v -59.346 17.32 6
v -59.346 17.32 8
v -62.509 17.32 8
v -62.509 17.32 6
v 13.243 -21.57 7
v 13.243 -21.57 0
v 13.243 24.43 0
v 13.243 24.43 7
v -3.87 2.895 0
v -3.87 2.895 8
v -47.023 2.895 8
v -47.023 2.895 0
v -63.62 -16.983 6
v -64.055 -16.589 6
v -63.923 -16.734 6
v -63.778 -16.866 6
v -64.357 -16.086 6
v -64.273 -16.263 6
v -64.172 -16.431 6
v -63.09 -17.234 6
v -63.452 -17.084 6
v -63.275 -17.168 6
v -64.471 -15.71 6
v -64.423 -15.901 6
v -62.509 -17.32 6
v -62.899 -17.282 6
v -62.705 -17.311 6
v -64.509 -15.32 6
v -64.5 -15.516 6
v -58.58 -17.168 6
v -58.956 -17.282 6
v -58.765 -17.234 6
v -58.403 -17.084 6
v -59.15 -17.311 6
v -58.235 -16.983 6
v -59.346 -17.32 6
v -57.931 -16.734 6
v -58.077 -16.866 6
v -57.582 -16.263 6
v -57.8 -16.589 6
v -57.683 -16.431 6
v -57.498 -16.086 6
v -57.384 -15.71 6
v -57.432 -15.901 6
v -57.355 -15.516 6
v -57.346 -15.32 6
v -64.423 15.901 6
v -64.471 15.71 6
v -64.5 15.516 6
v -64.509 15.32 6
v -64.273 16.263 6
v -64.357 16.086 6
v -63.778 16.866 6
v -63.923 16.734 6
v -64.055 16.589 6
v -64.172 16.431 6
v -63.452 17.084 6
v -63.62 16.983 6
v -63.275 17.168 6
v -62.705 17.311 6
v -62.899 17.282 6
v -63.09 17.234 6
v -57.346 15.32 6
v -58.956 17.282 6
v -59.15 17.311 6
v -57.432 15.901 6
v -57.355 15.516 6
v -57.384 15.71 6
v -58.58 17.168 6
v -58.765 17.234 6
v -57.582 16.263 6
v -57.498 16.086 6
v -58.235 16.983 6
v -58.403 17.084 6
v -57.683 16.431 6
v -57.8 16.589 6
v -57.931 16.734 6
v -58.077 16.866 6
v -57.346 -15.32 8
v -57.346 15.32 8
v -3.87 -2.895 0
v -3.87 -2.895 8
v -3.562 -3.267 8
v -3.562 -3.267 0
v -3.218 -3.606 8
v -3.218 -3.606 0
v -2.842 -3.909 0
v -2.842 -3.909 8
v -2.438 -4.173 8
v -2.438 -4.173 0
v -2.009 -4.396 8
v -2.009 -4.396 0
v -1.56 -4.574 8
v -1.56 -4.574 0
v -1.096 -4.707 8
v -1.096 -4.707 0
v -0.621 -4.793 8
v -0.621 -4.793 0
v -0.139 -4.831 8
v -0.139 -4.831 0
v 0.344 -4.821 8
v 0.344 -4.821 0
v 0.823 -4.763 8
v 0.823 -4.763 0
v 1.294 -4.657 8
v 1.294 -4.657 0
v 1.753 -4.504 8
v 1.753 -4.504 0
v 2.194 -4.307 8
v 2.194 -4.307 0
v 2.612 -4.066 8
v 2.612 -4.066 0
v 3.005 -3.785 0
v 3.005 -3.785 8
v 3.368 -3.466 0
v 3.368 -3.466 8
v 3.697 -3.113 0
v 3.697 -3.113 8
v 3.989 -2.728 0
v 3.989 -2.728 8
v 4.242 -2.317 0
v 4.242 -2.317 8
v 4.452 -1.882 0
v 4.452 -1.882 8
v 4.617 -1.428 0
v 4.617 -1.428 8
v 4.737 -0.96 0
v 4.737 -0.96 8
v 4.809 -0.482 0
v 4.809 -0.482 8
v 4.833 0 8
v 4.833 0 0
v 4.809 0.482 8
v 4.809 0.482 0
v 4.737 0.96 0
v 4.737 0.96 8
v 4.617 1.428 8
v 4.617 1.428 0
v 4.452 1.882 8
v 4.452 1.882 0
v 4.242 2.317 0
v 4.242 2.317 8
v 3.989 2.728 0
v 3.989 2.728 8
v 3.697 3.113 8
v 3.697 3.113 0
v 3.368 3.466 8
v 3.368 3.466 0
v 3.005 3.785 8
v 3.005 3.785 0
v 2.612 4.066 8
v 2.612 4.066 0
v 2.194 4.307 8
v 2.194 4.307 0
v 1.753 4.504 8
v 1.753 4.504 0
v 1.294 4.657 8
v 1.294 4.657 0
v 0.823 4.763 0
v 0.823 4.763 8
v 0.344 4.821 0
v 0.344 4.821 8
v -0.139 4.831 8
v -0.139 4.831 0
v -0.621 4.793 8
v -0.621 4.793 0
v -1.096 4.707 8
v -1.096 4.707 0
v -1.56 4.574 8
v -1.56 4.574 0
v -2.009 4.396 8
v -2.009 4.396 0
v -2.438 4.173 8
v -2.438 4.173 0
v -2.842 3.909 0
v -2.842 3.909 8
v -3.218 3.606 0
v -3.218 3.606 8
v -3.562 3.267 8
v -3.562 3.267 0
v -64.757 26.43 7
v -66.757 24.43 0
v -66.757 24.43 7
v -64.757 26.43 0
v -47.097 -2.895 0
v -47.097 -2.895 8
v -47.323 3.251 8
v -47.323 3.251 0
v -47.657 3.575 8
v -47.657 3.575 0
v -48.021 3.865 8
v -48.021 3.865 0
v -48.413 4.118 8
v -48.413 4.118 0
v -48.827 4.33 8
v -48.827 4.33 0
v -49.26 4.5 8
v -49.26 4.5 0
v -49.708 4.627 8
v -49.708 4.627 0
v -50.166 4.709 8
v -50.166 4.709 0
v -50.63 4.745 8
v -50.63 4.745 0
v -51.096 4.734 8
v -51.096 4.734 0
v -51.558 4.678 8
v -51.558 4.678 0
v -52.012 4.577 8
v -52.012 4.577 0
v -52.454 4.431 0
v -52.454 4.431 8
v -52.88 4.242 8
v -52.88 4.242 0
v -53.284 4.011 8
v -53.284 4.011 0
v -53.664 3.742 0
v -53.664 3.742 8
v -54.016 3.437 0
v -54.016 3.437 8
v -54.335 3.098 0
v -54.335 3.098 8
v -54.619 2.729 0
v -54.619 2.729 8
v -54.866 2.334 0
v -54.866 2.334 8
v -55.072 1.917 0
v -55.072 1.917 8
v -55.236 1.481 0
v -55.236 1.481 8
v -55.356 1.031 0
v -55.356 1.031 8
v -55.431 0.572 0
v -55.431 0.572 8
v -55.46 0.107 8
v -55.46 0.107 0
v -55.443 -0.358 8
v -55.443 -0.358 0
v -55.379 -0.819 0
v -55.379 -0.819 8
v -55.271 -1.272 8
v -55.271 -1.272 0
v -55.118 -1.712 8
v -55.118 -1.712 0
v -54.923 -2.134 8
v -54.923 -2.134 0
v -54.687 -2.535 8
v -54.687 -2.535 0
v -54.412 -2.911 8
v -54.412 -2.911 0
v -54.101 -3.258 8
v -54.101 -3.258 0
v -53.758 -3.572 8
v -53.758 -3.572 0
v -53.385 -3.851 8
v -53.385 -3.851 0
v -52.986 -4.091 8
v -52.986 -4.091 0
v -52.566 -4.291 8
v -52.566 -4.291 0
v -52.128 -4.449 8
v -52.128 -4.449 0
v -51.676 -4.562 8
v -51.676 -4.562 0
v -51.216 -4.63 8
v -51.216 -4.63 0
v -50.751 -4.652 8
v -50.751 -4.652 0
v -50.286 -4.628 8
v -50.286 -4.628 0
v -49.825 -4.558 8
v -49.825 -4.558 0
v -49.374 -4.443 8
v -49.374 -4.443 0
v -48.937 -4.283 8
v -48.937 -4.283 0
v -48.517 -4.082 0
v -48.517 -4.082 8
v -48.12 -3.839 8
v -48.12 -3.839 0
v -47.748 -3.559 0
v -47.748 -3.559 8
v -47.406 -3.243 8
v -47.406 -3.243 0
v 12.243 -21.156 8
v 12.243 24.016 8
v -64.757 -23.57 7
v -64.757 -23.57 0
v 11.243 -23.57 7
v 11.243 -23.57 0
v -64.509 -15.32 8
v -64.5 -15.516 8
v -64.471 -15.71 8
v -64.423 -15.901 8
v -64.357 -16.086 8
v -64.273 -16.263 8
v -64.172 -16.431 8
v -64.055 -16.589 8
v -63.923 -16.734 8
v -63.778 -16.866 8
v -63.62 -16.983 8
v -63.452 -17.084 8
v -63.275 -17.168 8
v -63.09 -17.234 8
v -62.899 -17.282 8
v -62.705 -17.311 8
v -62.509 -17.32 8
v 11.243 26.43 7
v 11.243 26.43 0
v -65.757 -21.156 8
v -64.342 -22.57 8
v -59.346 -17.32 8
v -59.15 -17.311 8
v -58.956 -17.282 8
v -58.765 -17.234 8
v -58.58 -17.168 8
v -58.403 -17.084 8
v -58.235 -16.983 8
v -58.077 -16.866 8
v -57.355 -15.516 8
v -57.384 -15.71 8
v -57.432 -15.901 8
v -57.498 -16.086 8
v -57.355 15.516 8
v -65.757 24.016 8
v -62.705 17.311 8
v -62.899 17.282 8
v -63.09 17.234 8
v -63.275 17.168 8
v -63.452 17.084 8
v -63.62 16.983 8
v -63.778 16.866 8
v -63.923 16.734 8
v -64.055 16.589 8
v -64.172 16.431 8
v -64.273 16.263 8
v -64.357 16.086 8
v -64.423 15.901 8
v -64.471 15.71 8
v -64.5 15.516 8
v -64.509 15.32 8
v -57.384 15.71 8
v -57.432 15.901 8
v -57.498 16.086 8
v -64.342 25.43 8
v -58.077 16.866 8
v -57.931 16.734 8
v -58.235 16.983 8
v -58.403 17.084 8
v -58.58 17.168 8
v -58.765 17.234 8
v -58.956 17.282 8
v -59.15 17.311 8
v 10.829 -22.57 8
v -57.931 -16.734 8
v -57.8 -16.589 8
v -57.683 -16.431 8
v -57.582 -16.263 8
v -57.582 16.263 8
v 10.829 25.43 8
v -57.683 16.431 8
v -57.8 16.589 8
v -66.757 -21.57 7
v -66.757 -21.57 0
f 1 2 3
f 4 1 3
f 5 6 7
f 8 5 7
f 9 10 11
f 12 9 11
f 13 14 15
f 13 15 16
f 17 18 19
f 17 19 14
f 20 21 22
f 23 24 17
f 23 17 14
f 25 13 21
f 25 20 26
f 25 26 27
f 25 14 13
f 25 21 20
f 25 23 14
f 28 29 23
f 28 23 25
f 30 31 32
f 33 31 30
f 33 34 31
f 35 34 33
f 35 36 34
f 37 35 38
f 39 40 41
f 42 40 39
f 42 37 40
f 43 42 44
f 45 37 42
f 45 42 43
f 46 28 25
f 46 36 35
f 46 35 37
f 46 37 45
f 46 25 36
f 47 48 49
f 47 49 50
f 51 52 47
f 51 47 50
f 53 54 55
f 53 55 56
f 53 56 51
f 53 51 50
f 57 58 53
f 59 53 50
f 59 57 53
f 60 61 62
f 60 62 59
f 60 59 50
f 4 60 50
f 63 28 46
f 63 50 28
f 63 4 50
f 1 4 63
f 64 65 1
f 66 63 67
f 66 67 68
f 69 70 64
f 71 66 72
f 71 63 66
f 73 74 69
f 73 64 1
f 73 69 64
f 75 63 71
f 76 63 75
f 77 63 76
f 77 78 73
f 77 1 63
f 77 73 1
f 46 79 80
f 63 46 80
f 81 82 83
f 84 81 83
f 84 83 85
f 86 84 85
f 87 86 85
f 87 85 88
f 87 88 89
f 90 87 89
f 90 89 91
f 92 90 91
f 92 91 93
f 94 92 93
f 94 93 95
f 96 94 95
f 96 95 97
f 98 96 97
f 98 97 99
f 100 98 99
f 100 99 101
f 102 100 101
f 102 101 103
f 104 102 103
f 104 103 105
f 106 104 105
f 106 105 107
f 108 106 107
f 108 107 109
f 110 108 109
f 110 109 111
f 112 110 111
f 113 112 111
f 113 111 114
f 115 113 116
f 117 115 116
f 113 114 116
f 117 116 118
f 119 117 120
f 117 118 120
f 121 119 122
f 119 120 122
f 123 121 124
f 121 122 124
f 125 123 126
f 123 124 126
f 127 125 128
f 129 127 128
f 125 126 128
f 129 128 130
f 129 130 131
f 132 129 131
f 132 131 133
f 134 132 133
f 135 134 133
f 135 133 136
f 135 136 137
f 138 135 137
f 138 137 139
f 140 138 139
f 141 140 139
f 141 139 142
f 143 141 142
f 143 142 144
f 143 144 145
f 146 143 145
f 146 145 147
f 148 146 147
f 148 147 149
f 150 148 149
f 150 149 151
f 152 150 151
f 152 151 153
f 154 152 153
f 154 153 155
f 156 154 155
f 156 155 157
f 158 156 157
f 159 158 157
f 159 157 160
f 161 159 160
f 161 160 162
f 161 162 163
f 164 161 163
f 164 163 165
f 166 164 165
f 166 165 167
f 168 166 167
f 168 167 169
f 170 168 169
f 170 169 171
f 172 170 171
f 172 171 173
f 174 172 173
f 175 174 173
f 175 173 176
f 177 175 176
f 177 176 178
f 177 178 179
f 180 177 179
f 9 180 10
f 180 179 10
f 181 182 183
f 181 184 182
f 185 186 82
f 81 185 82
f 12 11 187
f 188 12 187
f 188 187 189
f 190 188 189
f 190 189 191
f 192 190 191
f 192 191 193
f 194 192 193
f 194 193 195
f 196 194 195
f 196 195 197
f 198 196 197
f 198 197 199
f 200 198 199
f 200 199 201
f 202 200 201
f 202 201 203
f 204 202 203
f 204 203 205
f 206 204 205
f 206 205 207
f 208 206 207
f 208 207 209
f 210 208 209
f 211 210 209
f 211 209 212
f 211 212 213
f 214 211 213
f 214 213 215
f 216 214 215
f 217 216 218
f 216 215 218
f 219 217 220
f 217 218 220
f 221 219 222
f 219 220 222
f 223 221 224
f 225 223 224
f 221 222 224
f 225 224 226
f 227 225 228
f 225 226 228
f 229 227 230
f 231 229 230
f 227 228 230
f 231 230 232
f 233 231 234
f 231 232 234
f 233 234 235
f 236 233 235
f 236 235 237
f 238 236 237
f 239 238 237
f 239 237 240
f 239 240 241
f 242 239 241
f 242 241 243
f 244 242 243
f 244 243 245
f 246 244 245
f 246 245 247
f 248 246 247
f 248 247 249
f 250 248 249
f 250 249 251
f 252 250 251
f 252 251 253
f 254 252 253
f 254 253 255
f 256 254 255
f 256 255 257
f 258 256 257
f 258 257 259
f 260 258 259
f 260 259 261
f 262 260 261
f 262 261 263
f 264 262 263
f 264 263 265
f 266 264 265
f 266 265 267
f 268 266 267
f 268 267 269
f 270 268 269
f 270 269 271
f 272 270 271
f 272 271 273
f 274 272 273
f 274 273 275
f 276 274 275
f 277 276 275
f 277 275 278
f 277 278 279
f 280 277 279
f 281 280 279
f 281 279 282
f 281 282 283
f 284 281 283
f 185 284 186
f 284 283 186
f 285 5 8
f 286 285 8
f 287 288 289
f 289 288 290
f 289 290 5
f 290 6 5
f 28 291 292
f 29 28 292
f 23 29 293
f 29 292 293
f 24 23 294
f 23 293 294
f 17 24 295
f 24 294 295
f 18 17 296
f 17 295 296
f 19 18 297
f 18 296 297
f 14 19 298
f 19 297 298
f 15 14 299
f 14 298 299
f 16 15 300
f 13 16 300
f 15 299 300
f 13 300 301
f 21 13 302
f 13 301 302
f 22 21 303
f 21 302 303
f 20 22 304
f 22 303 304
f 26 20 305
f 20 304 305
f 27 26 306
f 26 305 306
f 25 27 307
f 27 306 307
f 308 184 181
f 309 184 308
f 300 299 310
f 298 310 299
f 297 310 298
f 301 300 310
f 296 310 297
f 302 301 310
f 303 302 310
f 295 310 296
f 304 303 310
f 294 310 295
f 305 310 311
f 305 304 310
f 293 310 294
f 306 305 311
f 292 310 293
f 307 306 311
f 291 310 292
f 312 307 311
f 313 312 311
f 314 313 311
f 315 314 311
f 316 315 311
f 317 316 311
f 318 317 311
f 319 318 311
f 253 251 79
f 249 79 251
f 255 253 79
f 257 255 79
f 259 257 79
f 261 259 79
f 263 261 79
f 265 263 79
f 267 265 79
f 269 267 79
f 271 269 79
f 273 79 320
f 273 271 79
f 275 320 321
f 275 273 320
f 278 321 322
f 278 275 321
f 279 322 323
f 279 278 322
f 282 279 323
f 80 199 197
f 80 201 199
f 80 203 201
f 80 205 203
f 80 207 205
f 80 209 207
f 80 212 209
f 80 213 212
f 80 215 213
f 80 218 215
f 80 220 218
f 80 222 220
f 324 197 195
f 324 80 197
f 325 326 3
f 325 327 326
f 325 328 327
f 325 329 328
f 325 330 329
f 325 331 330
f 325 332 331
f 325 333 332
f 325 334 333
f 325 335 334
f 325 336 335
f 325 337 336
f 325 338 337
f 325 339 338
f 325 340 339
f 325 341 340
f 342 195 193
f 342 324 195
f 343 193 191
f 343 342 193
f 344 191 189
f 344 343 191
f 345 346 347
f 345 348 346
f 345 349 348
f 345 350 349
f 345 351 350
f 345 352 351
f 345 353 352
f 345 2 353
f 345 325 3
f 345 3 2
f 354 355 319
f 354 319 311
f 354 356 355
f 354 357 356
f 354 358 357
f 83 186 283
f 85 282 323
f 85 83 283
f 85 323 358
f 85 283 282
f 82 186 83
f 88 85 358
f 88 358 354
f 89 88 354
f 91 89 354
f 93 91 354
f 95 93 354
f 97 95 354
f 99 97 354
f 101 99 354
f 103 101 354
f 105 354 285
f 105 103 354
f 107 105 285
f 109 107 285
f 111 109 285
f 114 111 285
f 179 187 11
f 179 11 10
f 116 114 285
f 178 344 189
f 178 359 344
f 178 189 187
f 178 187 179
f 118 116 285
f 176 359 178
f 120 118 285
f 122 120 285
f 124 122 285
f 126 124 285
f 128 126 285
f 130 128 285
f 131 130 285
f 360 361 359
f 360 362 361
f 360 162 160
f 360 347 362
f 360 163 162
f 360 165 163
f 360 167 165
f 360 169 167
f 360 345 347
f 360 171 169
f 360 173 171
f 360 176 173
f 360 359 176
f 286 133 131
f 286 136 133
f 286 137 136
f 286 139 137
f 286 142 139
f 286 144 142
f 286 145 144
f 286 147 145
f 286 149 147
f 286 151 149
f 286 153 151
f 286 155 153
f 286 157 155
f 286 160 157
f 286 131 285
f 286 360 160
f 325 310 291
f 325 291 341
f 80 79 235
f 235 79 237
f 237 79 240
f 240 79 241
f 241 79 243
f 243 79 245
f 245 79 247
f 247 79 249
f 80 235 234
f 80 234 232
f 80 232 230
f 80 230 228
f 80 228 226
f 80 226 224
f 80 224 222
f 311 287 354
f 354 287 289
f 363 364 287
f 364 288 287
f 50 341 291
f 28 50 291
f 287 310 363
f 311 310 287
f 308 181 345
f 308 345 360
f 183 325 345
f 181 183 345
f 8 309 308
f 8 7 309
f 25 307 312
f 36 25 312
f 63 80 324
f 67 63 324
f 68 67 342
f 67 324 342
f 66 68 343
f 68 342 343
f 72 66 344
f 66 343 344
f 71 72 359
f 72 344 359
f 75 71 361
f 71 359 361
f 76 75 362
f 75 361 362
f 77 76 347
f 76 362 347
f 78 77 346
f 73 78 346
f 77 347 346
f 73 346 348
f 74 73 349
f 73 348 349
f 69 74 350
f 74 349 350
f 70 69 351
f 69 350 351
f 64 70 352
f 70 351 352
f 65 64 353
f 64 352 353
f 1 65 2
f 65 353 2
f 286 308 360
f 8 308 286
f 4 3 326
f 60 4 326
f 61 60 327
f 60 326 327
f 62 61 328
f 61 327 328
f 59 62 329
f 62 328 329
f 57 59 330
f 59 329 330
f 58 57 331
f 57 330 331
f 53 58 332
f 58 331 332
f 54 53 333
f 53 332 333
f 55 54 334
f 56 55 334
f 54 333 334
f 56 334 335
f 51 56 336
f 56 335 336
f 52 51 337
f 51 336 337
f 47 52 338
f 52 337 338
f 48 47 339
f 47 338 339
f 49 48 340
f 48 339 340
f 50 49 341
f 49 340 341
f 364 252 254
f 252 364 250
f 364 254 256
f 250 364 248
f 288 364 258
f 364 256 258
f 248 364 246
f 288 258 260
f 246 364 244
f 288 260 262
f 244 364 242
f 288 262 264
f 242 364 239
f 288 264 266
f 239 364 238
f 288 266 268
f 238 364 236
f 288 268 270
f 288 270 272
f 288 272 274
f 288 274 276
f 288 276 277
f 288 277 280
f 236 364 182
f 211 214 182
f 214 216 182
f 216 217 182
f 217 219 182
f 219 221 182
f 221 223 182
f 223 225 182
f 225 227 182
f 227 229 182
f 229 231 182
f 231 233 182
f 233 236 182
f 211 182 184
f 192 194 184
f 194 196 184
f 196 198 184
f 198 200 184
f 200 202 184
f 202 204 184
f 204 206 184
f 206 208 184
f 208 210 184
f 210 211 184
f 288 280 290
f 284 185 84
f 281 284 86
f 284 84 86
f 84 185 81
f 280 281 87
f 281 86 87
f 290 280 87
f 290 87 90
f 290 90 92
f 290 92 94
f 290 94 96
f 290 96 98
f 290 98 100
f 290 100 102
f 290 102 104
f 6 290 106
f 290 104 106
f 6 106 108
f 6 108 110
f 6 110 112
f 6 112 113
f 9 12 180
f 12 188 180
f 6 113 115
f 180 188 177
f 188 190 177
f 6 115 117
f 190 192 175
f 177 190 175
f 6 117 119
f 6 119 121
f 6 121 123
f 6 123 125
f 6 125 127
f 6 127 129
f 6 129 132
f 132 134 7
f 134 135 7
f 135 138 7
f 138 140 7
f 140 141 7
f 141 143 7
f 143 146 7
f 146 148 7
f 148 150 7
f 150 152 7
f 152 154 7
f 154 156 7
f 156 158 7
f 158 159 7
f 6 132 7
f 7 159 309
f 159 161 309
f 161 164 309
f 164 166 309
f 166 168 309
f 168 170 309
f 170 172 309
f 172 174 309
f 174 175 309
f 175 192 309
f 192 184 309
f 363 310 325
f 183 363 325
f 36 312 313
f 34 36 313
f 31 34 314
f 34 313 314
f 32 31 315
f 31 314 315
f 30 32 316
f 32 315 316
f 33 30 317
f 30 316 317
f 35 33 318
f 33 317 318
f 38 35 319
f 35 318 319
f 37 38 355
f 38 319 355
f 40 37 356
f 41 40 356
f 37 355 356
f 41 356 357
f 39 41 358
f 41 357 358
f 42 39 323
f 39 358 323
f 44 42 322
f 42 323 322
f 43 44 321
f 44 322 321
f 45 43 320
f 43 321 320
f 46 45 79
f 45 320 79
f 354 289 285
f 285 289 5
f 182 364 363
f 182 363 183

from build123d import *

# Parameters (mm, degrees)
F0_W     = 80
F0_H     = 50
F1_DEPTH = 8
F3_DEPTH = 25.4
F5_DEPTH = 2
F6_SIZE  = 2
F7_SIZE  = 1


with BuildPart() as f1:
    # F0 (on Top) → F1 (new body)
    with BuildSketch(Plane.XY):
        with Locations((-26.7566908151, 1.4298928609)):
            Rectangle(F0_W, F0_H)
    extrude(amount=F1_DEPTH)

    # F2 (on face) → F3 (cut)
    with BuildSketch(Plane.XY.offset(8)):
        with BuildLine():
            ThreePointArc((-3.870154056, -2.8950243141), (4.8331416487, 0), (-3.870154056, 2.8950243141))
            Line((-3.870154056, 2.8950243141), (-47.0229552257, 2.8950243141))
            ThreePointArc((-47.0229552257, 2.8950243141), (-55.4596716368, 0.1073182684), (-47.0969311879, -2.8950243141))
            Line((-47.0969311879, -2.8950243141), (-3.870154056, -2.8950243141))
        make_face()
    extrude(amount=-F3_DEPTH, mode=Mode.SUBTRACT)

    # F4 (on face) → F5 (cut)
    with BuildSketch(Plane.XY.offset(8)):
        with BuildLine():
            ThreePointArc((-57.3456808925, 15.3201337457), (-57.9314673301, 16.734347308), (-59.3456808925, 17.3201337457))
            Line((-59.3456808925, 17.3201337457), (-62.5092031037, 17.3201337457))
            ThreePointArc((-62.5092031037, 17.3201337457), (-63.9234166661, 16.734347308), (-64.5092031037, 15.3201337457))
            Line((-64.5092031037, 15.3201337457), (-64.5092031037, -15.3201337457))
            ThreePointArc((-64.5092031037, -15.3201337457), (-63.9234166661, -16.734347308), (-62.5092031037, -17.3201337457))
            Line((-62.5092031037, -17.3201337457), (-59.3456808925, -17.3201337457))
            ThreePointArc((-59.3456808925, -17.3201337457), (-57.9314673301, -16.734347308), (-57.3456808925, -15.3201337457))
            Line((-57.3456808925, -15.3201337457), (-57.3456808925, 15.3201337457))
        make_face()
    extrude(amount=-F5_DEPTH, mode=Mode.SUBTRACT)

    # F6
    f6_edges = [f1.edges().sort_by_distance(p)[0] for p in [
        (13.243309, 26.429893, 4),
        (13.243309, -23.570107, 4),
        (-66.756691, -23.570107, 4),
        (-66.756691, 26.429893, 4),
    ]]
    chamfer(f6_edges, length=F6_SIZE)

    # F7
    f7_edges = [f1.edges().sort_by_distance(p)[0] for p in [
        (-66.756691, 1.429893, 8),
        (-26.756691, 26.429893, 8),
        (-65.756691, 25.429893, 8),
        (-65.756691, -22.570107, 8),
        (13.243309, 1.429893, 8),
        (12.243309, 25.429893, 8),
        (12.243309, -22.570107, 8),
        (-26.756691, -23.570107, 8),
    ]]
    chamfer(f7_edges, length=F7_SIZE)


solid = f1.part
